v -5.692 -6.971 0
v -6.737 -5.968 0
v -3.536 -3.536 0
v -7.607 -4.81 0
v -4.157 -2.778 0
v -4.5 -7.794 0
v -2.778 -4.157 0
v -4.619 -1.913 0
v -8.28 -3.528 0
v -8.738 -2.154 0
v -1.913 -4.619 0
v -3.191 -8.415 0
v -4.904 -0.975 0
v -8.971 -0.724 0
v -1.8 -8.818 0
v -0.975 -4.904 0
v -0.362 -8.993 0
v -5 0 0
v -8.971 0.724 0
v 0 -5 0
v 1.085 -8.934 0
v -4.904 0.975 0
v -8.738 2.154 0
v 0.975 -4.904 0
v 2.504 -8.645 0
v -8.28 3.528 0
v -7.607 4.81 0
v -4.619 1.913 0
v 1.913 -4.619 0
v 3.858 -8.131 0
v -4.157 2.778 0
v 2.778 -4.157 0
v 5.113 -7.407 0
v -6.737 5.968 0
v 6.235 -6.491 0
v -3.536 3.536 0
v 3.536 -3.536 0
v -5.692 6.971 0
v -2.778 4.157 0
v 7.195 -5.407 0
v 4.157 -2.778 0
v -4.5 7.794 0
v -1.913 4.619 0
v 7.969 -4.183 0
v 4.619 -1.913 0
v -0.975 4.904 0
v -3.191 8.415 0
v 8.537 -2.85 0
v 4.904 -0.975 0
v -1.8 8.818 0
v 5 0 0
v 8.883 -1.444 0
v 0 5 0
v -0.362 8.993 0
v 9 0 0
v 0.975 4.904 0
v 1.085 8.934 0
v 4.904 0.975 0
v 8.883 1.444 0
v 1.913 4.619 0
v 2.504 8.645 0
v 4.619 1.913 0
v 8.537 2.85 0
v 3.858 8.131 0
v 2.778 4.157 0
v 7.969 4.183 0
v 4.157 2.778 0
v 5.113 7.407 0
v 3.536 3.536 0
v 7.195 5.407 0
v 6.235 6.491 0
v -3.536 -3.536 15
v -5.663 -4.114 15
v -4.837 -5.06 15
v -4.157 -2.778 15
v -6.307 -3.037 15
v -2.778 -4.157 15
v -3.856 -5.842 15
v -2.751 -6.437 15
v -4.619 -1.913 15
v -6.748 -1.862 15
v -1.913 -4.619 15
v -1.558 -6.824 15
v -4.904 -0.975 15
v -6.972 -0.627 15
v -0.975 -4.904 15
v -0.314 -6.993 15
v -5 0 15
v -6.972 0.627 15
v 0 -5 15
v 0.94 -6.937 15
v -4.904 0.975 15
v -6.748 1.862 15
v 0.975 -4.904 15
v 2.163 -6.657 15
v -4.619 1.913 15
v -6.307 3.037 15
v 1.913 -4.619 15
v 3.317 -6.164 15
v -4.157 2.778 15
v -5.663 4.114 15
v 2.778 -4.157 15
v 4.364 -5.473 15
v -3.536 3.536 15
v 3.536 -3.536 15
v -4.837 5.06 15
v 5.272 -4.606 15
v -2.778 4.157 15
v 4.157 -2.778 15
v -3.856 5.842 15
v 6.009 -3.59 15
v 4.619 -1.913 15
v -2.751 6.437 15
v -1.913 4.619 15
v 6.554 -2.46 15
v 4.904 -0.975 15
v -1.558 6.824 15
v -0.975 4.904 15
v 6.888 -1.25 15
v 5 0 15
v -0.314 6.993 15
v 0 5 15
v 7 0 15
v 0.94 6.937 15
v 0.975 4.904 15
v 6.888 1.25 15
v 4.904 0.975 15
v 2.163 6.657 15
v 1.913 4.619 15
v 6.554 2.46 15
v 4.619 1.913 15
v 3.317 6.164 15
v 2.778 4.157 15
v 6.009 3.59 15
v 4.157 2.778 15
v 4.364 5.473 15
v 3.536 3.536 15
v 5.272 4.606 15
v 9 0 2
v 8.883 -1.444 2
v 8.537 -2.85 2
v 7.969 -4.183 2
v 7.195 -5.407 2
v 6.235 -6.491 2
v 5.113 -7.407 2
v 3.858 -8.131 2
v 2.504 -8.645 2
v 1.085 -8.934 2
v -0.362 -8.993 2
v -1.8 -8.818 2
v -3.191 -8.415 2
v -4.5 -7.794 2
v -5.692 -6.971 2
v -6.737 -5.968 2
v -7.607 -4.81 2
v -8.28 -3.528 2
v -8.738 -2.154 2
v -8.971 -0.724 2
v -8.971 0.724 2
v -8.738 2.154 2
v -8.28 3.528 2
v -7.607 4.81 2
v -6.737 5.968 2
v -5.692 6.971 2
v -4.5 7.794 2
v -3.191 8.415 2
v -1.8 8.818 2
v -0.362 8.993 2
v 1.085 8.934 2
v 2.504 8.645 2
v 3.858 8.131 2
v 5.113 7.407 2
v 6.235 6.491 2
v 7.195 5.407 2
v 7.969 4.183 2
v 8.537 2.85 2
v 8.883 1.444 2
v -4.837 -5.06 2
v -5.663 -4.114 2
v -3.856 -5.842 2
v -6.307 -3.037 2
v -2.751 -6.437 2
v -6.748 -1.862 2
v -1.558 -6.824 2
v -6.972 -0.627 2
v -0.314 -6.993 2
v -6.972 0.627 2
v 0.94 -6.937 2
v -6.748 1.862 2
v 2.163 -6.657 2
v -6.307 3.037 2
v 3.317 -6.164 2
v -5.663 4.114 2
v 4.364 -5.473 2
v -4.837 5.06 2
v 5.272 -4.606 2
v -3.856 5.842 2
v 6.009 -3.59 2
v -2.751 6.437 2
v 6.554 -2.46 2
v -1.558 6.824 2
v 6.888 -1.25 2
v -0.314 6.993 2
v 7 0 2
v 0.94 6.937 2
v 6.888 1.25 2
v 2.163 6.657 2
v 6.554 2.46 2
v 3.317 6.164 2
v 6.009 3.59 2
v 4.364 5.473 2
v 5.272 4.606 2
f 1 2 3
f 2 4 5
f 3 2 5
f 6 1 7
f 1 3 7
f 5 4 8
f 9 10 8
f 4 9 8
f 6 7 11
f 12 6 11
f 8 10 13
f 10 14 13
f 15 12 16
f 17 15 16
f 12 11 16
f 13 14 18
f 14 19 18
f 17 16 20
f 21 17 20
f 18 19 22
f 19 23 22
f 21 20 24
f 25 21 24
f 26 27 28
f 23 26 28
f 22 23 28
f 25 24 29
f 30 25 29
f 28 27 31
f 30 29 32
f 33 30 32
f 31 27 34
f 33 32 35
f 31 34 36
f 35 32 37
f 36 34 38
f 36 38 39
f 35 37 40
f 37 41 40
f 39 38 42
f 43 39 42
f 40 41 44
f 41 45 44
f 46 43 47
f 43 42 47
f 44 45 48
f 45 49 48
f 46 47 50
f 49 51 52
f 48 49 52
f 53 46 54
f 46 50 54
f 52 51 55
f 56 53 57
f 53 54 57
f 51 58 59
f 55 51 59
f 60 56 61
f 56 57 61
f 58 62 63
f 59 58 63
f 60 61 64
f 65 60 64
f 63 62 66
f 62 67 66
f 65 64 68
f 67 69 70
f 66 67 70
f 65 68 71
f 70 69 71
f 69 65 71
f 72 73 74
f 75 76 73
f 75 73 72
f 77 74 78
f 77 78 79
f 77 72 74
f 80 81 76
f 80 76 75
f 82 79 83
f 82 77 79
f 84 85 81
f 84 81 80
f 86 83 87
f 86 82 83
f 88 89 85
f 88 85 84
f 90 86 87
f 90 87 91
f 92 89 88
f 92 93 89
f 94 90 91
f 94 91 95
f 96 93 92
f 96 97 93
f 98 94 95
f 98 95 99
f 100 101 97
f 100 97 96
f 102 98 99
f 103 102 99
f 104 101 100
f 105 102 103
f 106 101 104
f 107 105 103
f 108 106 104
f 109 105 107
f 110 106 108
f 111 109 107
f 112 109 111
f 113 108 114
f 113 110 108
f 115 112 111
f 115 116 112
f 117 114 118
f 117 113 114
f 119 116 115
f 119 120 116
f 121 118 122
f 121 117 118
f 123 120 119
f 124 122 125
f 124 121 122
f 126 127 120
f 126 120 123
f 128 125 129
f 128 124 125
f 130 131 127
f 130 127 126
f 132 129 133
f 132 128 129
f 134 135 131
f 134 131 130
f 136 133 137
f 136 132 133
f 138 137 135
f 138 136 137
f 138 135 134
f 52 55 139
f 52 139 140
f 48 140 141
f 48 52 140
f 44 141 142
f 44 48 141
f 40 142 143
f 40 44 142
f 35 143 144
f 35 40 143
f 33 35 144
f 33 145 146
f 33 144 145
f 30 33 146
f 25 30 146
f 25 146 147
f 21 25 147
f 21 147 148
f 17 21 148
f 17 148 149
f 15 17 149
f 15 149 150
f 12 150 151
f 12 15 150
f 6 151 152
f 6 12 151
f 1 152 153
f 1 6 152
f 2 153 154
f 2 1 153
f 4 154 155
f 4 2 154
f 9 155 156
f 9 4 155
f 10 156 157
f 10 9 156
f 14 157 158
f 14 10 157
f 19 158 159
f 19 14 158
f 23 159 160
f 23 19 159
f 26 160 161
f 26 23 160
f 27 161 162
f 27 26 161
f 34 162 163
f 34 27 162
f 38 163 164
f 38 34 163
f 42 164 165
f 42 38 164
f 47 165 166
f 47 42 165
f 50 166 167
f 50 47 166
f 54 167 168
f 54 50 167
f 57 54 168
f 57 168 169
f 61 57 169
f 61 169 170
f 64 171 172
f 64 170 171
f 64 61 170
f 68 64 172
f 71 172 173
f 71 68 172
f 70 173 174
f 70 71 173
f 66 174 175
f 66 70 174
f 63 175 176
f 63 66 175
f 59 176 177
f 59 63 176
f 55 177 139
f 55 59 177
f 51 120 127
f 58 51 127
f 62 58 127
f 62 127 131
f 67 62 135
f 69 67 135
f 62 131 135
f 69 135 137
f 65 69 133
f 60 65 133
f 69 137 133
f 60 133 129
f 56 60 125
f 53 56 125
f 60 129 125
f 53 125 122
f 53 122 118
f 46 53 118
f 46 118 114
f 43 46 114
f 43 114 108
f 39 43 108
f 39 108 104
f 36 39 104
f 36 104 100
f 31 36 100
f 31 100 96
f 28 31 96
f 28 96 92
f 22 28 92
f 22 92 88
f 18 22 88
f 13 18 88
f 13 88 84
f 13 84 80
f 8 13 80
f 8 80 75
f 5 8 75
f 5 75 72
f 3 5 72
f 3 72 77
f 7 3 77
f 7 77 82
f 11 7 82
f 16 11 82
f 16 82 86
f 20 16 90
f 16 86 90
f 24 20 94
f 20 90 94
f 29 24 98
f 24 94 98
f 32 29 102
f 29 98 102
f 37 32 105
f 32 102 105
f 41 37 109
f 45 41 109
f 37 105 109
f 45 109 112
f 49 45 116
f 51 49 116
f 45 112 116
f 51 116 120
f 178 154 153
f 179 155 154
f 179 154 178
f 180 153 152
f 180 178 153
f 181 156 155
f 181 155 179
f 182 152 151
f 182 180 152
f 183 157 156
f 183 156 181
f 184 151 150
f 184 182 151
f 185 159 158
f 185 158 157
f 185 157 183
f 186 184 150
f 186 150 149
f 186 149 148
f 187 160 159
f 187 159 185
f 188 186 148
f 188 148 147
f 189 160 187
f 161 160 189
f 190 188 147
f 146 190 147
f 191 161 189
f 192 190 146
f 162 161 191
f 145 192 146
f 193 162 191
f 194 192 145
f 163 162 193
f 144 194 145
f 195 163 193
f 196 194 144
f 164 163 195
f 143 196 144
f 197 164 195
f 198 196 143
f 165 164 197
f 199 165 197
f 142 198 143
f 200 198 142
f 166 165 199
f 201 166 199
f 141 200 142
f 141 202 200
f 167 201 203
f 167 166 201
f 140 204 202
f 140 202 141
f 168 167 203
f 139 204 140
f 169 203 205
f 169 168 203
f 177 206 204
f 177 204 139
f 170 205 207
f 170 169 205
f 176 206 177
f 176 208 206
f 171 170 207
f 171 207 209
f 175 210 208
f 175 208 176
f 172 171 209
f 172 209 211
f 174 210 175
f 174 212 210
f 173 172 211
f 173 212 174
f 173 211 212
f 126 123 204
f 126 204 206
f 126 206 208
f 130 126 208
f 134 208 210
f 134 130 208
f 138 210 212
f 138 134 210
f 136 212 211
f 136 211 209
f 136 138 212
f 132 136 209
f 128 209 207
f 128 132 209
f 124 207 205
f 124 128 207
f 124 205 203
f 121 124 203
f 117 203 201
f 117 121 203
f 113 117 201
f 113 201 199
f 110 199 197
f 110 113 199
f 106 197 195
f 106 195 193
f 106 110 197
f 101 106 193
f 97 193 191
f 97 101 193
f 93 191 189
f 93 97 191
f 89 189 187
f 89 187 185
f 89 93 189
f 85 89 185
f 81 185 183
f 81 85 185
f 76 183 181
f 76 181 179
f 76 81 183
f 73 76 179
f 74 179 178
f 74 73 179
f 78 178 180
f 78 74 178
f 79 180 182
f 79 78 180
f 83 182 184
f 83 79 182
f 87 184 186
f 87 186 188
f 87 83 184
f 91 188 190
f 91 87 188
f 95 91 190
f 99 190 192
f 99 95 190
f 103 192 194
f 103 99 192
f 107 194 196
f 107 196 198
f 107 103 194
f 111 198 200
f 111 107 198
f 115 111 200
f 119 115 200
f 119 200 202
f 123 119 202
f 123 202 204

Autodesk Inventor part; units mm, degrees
ref_plane "YZ Plane" through (0, 0, 0) normal (1, 0, 0) x (0, 1, 0)
ref_plane "XZ Plane" through (0, 0, 0) normal (0, 1, 0) x (-1, 0, 0)
ref_plane "XY Plane" through (0, 0, 0) normal (0, 0, 1) x (1, 0, 0)
sketch "Sketch1" plane through (0, 0, 0) normal (0, 0, 1) x (1, 0, 0)
  circle A0 centre (0, 0) radius 9
  dimension "d0" = 18
extrude "Extrusion1" add sketch "Sketch1" along normal blind 15
sketch "Sketch2" plane through (0, 0, 15) normal (0, 0, 1) x (1, 0, 0)
  circle A0 centre (0, 0) radius 9 projected
  circle A1 centre (0, 0) radius 7
  dimension "d3" = 14
extrude "Extrusion2" cut sketch "Sketch2" against normal blind 13
sketch "Sketch3" plane through (0, 0, 15) normal (0, 0, 1) x (1, 0, 0)
  circle A0 centre (0, 0) radius 7 projected
  circle A1 centre (0, 0) radius 5
  dimension "d6" = 10
extrude "Extrusion3" cut sketch "Sketch3" against normal blind 15 contours A1
properties part number "BUCHA DA PLACA(38)" material "Bronze, Soft Tin"
